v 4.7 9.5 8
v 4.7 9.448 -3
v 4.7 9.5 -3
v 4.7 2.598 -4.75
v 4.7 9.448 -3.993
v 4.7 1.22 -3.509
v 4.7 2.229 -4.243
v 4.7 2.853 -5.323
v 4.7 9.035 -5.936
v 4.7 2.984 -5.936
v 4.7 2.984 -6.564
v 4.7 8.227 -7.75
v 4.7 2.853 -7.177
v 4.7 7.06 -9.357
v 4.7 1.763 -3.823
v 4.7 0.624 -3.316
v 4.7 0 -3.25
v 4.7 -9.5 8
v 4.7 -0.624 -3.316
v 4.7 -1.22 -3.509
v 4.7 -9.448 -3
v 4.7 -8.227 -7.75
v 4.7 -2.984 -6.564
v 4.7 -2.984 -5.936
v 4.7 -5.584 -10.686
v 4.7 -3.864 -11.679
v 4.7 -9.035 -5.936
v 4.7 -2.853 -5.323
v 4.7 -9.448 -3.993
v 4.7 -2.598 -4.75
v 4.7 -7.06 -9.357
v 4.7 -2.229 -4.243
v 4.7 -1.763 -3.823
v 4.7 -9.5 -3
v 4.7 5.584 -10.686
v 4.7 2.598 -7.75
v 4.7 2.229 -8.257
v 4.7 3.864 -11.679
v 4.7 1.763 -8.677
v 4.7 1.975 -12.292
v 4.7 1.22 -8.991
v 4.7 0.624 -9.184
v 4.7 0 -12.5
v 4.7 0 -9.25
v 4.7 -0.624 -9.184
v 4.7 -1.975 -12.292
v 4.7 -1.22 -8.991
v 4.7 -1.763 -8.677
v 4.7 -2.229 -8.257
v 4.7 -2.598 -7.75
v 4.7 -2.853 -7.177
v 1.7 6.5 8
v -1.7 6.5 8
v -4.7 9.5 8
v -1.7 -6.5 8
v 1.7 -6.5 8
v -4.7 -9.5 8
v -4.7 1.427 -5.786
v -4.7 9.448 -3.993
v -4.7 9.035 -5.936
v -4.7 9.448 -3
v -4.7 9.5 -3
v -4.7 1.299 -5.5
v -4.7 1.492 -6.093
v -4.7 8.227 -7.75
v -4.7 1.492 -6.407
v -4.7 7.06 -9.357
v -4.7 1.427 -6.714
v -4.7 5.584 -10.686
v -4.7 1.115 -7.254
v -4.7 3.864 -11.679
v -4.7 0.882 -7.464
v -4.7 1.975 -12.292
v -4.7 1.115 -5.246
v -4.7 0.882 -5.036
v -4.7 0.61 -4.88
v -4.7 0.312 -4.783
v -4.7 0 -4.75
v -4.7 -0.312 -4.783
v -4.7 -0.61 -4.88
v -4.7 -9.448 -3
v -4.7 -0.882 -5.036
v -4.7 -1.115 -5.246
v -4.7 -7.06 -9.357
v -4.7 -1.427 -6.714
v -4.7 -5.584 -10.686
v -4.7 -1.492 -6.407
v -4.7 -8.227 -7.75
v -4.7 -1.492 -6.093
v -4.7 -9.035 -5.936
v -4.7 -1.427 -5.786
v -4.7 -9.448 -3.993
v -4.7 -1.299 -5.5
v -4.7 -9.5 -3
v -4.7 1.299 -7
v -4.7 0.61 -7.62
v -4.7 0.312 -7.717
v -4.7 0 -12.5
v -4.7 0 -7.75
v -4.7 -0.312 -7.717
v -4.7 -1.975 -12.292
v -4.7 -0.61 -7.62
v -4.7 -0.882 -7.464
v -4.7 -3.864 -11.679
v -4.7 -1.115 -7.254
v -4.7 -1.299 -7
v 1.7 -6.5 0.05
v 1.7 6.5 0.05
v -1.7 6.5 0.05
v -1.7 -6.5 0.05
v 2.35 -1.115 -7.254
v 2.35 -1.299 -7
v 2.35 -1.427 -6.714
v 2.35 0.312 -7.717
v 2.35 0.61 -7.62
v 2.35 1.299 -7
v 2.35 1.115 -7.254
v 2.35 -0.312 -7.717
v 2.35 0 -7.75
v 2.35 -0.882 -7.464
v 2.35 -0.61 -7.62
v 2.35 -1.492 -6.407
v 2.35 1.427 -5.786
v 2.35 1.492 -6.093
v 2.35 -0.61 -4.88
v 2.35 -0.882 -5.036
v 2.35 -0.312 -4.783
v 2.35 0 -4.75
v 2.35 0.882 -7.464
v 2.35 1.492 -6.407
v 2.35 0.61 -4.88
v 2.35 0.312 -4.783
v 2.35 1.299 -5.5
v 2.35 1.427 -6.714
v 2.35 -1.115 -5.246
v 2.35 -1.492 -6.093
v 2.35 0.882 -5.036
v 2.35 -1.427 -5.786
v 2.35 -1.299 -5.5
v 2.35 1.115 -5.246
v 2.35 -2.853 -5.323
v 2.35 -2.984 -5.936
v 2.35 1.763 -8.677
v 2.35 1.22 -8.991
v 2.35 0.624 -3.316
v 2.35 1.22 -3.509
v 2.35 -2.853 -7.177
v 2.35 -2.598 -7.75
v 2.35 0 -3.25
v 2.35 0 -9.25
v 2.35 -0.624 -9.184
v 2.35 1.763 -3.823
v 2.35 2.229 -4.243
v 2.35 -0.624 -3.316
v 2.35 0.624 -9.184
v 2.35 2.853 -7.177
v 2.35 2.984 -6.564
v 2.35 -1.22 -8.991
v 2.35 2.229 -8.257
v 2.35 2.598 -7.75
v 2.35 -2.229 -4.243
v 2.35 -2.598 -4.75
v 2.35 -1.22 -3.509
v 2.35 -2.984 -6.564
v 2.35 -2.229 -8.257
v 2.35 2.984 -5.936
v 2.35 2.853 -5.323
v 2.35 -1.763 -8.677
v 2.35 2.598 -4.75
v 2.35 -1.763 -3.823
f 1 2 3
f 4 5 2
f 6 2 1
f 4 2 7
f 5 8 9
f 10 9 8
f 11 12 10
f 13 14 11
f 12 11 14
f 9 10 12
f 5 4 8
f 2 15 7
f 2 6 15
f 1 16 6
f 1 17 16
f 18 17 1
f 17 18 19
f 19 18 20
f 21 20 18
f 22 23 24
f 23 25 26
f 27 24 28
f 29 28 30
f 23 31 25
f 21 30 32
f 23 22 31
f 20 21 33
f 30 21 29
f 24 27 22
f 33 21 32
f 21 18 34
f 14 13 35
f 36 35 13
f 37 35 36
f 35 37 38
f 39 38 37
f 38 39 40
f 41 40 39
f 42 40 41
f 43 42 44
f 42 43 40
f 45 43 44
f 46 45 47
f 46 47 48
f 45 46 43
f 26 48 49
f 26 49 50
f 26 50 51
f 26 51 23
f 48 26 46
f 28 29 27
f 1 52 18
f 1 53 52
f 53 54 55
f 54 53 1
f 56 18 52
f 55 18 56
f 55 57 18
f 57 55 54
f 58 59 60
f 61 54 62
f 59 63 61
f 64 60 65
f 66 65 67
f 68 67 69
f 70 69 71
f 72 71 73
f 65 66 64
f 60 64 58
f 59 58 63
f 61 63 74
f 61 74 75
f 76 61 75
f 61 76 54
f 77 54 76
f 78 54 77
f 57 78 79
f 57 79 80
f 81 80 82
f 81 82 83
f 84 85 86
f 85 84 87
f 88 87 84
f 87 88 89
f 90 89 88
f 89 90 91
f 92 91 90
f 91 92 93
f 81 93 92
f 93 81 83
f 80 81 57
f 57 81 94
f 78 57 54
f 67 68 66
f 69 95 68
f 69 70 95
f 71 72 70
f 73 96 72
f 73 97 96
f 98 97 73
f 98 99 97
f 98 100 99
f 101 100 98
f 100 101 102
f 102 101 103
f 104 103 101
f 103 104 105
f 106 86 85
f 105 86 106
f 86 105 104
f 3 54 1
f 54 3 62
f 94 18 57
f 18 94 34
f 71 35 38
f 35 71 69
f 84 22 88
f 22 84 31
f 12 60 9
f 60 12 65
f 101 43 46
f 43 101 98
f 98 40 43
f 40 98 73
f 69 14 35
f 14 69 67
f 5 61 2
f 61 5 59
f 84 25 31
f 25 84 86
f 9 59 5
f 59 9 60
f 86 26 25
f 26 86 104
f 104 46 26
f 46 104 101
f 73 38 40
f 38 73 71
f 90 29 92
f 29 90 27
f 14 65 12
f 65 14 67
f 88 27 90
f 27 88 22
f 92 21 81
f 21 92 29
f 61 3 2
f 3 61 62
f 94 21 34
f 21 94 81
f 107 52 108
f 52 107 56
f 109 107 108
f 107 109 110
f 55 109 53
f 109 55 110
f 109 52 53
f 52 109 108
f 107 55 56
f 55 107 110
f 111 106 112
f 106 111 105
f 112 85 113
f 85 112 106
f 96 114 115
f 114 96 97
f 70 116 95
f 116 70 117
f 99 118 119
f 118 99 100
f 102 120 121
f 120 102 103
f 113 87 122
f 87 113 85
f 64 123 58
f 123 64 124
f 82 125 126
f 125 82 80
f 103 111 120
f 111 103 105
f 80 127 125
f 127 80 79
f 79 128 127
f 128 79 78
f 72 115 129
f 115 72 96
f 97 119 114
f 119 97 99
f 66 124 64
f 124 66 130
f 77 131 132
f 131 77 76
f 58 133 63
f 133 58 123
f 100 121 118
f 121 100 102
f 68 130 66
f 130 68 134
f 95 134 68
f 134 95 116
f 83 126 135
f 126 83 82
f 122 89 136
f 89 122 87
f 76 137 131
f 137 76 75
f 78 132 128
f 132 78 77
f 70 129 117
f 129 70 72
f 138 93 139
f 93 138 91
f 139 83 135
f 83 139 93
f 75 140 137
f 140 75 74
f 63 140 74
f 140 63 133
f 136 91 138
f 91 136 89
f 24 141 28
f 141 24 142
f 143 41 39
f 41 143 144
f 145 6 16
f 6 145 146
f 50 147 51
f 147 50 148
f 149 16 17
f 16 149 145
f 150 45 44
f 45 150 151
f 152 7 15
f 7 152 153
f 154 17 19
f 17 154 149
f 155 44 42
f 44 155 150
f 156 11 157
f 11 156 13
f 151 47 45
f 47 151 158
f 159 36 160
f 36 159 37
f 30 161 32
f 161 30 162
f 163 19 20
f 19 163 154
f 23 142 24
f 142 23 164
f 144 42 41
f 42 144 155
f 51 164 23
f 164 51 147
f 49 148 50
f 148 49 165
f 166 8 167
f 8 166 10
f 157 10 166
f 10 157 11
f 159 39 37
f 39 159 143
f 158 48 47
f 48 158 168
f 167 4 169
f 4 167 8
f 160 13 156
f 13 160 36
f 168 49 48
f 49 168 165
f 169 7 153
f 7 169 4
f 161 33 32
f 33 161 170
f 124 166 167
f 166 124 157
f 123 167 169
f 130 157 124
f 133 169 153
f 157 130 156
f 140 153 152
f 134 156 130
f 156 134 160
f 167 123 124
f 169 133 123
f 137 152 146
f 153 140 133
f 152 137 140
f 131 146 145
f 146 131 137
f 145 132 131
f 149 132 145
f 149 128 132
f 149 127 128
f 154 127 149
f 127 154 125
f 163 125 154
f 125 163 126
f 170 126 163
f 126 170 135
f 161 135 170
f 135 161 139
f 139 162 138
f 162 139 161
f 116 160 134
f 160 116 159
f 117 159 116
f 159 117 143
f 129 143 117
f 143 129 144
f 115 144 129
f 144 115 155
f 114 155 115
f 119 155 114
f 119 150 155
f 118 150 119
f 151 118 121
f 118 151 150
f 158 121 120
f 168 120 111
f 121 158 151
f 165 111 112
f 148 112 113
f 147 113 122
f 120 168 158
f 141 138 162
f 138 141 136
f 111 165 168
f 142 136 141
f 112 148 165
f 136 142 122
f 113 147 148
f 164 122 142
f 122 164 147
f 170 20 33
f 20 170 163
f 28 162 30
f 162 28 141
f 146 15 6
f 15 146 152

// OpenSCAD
// -----------------------------------------------------------
// Customizable Socket Organizers: Rectangular End Cap
// -----------------------------------------------------------
//
// Zemba Craftworks
// youtube.com/zembacraftworks
// thingiverse.com/zembacraftworks/about

// This is a configurable, 3D printable insert designed to
// slide onto a metal or wooden bar to create socket set
// organizers. Dimensions can be adjusted for sockets of
// all sizes and to slide onto bars/holders of any size.

// Date Created:  2018-12-20
// Last Modified: 2018-12-20

// Critical Dimensions
// -------------------
// Adjust these dimensions and verify them with a test print
// before printing holders for all of your sockets! You want a
// snug fit but not so tight that anything gets stuck. These
// values will vary depending on your sockets, the rail you're
// using, and the calibration of your printer.


rx = 3.4;           // Rail Cross-Section Thickness (mm)
ry = 13;            // Rail Cross-Section Width (mm)

ct = 3;             // Wall Thickness of End Cap (mm)
ch = 8;             // Height of End Cap (mm)

fn1 = 30;           
hd1 = 3;            // Mounting Hole Diameter (Through-hole)
hd2 = 6;            // Mounting Hole Diameter (Counterbore)

hz = (ct+ry/2+ct)/2;// Mounting Hole Offset Distance (from Rail)
hx = rx/4+ct/2;     // Mounting Hole Counterbore Depth

// Tolerance Value
// ---------------
// When shapes are subtracted through difference() in
// OpenSCAD, there is ambiguity if any faces of the two shapes
// occupy the same space. Adding a small value 't' to make
// the subtracted shape slightly larger prevents this.

t = 0.1;

union(){
    
// Rail Clamp
difference(){

    union(){
    // Rail Clamp
    translate([-(rx+2*ct)/2, -(ry+2*ct)/2, 0]){
        cube([rx + 2*ct, ry + 2*ct, ch]);    }    
    // Rounded Edge
    translate([-rx/2-ct,0,-ct])
    rotate([0,90,0])
        cylinder(r=ry/2+ct,h=rx+2*ct,$fn=fn1);
    // Rail Cap
    translate([-(rx+2*ct)/2, -(ry+2*ct)/2, -ct]){
    cube([rx + 2*ct, ry + 2*ct, ct]);    }}

    union(){
    // Rail
    translate([-rx/2, -ry/2, t/2]){
        cube([rx, ry, ch+t]);    }

    // Mounting Hole
    translate([-rx/2-ct-t/2,0,-hz])
    rotate([0,90,0])
    cylinder(r=hd1/2,h=rx+2*ct+t,$fn=fn1);

    // Mounting Hole Counterbore
    translate([rx/2+ct-hx,0,-hz])
    rotate([0,90,0])
    cylinder(r=hd2/2,h=hx+t,$fn=fn1);}

}}
